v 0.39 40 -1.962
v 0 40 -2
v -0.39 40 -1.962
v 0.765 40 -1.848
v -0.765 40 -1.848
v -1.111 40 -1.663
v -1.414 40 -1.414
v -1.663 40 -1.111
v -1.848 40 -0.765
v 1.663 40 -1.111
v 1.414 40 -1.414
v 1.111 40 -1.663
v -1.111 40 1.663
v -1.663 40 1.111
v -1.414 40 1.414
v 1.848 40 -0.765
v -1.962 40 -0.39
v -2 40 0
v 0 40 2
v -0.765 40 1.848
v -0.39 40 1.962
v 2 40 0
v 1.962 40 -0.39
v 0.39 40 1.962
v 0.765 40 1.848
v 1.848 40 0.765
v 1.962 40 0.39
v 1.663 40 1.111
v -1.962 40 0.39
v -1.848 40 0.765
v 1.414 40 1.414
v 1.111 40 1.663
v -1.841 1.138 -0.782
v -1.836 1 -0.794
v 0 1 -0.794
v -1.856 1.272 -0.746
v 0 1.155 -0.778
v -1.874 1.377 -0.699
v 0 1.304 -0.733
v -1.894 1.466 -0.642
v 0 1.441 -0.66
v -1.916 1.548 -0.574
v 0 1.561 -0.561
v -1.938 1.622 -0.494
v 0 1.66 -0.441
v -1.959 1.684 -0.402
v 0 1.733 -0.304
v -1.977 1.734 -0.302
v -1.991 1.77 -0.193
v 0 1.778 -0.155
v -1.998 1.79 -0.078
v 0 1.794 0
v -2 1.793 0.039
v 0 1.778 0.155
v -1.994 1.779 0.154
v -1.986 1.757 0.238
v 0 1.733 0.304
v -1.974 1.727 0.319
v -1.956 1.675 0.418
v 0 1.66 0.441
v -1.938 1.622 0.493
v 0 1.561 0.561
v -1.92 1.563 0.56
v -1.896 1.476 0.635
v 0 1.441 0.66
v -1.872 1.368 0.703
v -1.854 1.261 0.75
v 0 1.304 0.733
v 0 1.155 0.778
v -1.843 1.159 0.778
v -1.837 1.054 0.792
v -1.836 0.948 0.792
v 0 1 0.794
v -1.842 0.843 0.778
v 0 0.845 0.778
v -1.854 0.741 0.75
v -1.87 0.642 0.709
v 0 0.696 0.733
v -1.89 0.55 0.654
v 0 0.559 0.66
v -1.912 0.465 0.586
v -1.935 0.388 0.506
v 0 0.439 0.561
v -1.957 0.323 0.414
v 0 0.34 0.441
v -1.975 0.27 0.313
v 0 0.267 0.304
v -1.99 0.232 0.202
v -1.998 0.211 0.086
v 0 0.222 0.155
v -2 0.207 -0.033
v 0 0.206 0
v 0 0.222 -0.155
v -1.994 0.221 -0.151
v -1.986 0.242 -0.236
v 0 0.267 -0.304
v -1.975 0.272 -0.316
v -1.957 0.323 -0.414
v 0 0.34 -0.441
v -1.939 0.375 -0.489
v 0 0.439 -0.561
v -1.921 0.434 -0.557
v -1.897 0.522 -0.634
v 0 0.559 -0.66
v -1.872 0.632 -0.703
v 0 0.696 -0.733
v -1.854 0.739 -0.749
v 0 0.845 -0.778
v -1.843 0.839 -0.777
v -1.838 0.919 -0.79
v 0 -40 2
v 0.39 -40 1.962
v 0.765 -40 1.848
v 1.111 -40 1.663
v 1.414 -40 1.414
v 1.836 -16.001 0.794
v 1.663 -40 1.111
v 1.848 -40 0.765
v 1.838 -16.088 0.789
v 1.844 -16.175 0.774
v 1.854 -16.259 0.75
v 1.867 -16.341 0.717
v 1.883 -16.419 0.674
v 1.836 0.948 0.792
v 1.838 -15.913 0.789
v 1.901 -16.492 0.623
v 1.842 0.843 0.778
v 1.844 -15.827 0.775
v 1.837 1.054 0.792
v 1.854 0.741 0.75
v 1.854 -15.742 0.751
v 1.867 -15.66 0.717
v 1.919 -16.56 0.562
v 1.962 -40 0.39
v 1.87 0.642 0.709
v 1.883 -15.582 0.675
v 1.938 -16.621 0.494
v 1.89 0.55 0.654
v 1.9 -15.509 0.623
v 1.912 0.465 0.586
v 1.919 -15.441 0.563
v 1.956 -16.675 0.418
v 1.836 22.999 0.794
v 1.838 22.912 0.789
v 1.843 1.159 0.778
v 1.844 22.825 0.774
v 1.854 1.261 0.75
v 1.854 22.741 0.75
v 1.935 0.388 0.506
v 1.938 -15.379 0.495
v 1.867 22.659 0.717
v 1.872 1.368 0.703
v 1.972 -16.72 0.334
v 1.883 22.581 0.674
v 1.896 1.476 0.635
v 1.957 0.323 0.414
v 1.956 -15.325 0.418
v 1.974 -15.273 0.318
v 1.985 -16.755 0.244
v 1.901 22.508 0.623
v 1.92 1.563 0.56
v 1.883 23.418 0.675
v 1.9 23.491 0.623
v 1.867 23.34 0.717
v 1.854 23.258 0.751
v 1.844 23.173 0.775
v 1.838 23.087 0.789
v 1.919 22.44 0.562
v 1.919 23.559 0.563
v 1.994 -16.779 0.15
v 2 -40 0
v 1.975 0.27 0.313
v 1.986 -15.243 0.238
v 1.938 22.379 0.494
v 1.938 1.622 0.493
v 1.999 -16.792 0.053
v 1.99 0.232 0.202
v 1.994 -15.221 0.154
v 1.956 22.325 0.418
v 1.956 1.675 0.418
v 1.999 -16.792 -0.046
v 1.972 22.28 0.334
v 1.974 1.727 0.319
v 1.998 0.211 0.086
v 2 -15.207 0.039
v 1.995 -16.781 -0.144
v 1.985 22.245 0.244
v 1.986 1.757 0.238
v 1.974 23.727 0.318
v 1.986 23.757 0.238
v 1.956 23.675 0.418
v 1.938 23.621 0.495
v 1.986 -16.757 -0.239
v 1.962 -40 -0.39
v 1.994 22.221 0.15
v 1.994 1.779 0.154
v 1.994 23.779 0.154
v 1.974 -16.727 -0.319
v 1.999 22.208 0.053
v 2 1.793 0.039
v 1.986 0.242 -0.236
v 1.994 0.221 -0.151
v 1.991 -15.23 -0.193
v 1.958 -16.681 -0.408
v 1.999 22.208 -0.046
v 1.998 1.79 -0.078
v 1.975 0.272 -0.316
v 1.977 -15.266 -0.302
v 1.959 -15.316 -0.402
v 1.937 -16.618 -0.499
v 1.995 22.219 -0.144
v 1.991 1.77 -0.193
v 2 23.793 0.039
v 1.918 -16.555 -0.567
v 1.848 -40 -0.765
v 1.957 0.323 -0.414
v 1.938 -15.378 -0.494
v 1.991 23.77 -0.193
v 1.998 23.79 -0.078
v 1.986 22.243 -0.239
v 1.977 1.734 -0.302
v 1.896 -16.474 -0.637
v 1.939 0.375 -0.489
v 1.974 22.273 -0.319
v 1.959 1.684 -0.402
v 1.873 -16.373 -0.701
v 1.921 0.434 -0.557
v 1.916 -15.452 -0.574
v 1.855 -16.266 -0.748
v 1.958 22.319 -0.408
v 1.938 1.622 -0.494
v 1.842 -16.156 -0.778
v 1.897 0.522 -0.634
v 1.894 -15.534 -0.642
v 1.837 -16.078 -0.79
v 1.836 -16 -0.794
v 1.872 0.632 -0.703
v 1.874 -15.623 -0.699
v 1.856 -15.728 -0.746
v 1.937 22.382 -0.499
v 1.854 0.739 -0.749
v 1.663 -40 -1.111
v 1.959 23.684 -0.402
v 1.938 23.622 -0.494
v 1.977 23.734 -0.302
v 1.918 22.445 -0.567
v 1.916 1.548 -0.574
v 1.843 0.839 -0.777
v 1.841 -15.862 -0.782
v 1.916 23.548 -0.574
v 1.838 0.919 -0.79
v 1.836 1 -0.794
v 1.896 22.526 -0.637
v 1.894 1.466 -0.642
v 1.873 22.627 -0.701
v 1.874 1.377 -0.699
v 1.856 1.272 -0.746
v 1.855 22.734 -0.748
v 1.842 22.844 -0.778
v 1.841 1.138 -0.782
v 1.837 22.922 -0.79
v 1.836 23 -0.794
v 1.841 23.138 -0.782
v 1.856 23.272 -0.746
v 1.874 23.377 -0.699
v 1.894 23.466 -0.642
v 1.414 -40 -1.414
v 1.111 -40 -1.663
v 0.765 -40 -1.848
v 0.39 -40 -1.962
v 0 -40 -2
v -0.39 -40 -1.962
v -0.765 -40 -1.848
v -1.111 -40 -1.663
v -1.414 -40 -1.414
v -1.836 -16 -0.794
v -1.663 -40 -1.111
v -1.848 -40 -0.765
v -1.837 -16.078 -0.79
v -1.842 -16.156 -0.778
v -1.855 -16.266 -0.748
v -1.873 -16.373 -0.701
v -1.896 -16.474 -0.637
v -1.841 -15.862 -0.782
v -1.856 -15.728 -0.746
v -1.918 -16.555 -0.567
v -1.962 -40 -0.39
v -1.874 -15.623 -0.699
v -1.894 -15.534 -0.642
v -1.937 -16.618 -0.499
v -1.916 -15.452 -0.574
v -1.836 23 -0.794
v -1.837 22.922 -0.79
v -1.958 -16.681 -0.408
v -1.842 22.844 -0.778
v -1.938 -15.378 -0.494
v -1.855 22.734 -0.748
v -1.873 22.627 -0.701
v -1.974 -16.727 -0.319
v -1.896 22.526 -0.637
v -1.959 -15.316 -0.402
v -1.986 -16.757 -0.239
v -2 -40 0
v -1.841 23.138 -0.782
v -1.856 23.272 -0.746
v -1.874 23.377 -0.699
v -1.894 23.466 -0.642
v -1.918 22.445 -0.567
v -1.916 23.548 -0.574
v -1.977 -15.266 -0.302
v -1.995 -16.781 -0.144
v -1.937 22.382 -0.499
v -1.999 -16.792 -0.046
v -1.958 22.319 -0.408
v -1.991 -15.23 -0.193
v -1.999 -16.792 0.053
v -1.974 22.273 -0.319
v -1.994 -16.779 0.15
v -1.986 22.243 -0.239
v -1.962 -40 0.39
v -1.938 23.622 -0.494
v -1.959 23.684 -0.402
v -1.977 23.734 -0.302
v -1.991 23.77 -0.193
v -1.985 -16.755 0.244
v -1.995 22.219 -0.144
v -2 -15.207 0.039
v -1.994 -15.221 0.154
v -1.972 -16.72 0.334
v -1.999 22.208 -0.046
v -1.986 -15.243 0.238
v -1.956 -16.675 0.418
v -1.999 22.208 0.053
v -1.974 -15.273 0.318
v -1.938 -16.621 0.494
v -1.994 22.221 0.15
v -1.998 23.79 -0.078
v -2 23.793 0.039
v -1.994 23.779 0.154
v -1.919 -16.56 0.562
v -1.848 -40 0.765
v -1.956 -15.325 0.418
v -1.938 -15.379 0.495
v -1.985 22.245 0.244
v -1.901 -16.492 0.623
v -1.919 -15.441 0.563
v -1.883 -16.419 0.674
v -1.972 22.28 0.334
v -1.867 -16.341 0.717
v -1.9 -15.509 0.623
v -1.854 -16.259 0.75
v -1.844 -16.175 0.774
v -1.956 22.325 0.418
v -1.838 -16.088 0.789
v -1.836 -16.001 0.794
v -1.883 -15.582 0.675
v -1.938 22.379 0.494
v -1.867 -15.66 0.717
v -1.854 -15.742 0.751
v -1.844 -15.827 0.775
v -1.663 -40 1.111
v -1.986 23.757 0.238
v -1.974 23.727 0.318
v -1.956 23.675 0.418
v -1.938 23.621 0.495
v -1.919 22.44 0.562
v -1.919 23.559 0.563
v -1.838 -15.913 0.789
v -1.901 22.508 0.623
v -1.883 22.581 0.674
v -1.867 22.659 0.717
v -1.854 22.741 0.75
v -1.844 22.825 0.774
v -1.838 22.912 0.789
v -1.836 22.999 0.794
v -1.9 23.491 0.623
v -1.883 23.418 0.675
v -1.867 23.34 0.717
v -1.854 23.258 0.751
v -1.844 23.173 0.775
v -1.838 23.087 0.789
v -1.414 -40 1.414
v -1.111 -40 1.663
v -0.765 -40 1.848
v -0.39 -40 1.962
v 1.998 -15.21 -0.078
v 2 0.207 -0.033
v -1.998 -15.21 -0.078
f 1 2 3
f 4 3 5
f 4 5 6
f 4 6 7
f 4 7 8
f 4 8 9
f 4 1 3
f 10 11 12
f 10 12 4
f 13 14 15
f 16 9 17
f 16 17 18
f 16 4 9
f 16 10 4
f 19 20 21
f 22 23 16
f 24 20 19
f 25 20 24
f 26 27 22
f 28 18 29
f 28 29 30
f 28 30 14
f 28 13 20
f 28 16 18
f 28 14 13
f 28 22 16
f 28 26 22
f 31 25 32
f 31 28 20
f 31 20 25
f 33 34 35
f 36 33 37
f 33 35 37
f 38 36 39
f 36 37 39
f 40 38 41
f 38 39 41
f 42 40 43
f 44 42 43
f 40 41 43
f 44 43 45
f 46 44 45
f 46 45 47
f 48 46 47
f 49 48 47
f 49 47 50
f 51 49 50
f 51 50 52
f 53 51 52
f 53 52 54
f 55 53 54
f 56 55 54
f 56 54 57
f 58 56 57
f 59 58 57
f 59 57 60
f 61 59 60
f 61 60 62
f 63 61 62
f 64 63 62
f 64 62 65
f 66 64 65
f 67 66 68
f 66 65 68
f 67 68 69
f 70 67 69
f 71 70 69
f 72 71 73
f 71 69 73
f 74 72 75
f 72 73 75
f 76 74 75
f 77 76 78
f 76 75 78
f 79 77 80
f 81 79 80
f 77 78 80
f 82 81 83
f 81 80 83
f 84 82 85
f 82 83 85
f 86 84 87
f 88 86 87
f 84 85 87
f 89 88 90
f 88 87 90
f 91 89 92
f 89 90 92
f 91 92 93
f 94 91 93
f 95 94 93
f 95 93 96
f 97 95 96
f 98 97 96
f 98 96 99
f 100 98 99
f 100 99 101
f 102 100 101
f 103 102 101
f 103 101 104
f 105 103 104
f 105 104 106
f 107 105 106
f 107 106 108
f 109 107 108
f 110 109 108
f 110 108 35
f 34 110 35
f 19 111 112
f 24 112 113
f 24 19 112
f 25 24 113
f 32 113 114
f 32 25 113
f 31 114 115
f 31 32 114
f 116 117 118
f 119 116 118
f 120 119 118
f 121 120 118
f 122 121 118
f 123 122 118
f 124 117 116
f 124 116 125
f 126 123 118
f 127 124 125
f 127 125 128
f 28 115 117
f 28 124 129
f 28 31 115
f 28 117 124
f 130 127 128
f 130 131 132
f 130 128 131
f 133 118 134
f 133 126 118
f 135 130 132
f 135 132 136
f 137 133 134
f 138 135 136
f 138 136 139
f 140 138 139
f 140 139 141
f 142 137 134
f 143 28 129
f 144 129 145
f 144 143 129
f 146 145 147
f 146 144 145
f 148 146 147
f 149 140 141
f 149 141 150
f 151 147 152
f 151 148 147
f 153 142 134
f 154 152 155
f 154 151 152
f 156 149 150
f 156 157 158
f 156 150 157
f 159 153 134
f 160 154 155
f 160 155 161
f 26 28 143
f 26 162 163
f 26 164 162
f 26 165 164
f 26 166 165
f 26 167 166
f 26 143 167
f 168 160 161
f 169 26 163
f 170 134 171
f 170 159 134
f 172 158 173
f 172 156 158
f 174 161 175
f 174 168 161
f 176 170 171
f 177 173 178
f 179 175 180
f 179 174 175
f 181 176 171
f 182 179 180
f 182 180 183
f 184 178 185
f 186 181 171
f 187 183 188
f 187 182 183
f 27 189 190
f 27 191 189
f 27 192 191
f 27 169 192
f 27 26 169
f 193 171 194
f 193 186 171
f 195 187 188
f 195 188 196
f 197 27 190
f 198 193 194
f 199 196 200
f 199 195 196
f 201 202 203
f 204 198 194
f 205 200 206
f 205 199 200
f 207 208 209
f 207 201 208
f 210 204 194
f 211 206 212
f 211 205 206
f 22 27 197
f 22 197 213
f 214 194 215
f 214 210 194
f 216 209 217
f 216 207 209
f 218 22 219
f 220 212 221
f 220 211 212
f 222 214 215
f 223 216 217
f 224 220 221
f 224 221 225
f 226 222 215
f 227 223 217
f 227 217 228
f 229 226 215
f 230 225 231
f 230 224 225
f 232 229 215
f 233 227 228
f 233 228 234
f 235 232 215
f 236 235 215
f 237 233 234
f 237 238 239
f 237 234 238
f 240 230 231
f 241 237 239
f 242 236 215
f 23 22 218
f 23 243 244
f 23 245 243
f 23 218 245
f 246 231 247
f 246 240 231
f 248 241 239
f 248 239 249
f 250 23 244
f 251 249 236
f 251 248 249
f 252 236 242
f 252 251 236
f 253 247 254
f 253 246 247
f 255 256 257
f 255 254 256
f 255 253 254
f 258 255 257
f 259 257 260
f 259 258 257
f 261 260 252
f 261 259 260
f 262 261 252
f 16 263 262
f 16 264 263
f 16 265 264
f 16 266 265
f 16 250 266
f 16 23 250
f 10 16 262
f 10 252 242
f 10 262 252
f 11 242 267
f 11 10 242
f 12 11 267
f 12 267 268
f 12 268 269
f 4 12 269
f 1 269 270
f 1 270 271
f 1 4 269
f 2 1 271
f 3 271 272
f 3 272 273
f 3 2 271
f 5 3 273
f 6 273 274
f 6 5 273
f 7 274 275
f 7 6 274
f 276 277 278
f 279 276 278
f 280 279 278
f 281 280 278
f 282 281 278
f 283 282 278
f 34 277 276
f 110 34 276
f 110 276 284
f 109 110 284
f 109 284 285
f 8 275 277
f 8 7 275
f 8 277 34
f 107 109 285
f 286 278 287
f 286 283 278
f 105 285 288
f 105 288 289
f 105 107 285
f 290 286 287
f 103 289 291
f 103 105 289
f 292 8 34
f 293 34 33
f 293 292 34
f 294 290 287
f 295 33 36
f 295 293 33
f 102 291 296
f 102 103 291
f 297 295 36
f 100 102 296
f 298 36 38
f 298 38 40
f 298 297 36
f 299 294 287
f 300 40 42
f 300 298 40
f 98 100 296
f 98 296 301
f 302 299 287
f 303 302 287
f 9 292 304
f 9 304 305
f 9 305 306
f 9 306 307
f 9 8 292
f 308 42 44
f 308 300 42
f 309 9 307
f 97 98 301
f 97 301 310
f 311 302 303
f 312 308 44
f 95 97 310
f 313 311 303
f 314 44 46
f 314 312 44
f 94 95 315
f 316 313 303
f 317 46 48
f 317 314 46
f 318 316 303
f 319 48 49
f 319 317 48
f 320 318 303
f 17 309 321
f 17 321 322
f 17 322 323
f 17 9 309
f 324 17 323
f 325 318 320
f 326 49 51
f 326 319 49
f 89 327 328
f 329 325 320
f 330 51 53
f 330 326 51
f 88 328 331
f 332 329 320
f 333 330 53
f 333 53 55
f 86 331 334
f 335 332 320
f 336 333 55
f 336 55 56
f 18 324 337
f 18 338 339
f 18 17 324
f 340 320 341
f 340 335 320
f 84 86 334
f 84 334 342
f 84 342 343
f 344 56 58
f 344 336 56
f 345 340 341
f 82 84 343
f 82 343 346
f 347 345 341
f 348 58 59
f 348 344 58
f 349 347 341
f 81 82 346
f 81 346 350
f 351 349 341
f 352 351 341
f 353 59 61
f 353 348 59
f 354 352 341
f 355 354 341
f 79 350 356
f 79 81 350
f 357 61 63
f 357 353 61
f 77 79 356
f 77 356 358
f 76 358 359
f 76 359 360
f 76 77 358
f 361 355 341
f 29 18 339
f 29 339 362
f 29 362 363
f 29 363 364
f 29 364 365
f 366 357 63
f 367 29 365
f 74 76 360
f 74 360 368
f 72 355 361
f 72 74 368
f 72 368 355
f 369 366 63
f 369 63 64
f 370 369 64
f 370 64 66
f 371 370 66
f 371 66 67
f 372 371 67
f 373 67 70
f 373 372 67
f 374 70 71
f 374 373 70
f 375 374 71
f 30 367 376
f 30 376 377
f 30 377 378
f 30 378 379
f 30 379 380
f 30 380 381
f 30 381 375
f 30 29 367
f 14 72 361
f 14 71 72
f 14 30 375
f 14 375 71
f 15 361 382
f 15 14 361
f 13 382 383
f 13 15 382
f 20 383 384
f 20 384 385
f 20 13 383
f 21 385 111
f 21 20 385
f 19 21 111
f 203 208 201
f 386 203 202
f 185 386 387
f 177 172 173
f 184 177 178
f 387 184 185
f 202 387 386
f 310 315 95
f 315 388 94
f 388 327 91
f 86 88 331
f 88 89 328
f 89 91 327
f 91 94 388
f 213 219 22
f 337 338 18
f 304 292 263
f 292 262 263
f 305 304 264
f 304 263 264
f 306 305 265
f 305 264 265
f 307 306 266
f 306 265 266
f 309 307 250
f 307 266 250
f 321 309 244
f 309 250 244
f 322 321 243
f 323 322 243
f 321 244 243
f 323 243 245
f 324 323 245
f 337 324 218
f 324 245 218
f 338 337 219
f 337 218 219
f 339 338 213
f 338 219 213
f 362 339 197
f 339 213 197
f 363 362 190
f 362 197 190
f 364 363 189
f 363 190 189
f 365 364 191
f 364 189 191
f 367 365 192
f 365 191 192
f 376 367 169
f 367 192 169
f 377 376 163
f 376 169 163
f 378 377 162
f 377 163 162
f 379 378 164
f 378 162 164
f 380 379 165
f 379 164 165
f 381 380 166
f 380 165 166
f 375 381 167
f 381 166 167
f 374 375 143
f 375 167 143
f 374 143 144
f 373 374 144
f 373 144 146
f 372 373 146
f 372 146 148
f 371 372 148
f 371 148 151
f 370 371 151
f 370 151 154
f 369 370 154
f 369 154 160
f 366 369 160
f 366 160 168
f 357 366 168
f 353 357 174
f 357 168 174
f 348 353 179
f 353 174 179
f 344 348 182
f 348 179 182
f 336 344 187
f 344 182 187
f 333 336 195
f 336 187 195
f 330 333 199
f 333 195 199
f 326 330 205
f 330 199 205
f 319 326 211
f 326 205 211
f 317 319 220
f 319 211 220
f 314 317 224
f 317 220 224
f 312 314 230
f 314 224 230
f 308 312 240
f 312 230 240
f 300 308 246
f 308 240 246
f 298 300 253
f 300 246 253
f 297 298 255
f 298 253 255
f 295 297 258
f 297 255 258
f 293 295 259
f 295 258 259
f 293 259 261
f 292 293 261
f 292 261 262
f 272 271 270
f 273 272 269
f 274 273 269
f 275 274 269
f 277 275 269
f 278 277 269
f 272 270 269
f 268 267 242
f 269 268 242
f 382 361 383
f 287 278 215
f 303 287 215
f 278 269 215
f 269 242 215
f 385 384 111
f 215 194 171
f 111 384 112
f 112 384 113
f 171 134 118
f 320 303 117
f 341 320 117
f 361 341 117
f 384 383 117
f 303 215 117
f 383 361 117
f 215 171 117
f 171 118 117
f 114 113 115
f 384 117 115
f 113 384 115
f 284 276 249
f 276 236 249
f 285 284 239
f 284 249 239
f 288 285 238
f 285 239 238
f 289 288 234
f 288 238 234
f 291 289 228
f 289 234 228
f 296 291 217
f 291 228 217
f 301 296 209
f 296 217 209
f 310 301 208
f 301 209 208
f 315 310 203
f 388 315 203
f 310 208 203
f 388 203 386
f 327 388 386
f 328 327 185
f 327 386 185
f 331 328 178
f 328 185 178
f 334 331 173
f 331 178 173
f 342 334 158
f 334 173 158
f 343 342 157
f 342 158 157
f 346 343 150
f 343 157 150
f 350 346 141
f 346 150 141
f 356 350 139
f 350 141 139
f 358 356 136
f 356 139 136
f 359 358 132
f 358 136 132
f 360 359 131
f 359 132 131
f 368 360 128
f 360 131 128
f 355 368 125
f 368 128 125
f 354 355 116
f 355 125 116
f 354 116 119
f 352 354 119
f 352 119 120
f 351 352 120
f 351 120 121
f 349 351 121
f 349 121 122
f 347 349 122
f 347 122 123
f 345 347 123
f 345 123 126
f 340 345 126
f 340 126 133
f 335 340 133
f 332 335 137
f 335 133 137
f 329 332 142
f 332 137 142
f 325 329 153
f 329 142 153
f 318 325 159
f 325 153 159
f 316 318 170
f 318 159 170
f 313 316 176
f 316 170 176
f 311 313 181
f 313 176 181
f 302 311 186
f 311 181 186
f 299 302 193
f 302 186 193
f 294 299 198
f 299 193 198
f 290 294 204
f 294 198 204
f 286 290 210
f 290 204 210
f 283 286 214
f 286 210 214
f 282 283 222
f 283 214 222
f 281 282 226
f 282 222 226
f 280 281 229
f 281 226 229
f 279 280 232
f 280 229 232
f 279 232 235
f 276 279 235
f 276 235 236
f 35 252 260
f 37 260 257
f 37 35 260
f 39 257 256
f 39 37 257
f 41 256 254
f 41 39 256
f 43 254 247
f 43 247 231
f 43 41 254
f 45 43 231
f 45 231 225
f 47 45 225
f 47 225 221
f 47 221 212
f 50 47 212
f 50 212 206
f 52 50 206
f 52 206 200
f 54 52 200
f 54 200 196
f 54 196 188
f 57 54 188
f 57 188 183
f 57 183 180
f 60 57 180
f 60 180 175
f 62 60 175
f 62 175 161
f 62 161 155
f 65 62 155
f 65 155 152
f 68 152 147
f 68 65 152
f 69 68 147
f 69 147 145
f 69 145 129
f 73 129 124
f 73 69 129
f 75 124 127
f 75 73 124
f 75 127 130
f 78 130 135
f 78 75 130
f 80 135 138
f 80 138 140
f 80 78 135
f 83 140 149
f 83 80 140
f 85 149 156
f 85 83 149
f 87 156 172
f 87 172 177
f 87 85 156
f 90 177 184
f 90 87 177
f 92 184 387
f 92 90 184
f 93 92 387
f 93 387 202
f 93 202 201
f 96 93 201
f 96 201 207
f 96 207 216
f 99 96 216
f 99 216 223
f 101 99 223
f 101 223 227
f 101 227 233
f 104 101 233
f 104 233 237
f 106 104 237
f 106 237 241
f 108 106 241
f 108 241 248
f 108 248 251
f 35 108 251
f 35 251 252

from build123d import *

# Parameters (mm, degrees)
SKETCH1_R           = 2
BOSS_EXTRUDE1_DEPTH = 40
SKETCH3_R           = 0.79375
CUT_EXTRUDE1_DEPTH  = 5
SKETCH4_R           = 0.79375
CUT_EXTRUDE2_DEPTH  = 5


with BuildPart() as part:
    # Sketch1 → Boss-Extrude1 (new, symmetric)
    with BuildSketch(Plane(origin=(0, 0, 0), x_dir=(1, 0, 0), z_dir=(0, 1, 0))):
        with Locations(Location((0, 0, 0), (0, 0, 270))):
            Circle(SKETCH1_R)
    extrude(amount=BOSS_EXTRUDE1_DEPTH, both=True)

    # Sketch3 → Cut-Extrude1 (cut, symmetric)
    with BuildSketch(Plane(origin=(0, 0, 0), x_dir=(0, 0, -1), z_dir=(1, 0, 0))):
        with Locations((0, 1)):
            Circle(SKETCH3_R)
        with Locations((0, 23)):
            Circle(SKETCH3_R)
    extrude(amount=CUT_EXTRUDE1_DEPTH, both=True, mode=Mode.SUBTRACT)

    # Sketch4 → Cut-Extrude2 (cut, symmetric)
    with BuildSketch(Plane(origin=(0, 0, 0), x_dir=(0, 0, -1), z_dir=(1, 0, 0))):
        with Locations((0, -16)):
            Circle(SKETCH4_R)
    extrude(amount=CUT_EXTRUDE2_DEPTH, both=True, mode=Mode.SUBTRACT)


solid = part.part
